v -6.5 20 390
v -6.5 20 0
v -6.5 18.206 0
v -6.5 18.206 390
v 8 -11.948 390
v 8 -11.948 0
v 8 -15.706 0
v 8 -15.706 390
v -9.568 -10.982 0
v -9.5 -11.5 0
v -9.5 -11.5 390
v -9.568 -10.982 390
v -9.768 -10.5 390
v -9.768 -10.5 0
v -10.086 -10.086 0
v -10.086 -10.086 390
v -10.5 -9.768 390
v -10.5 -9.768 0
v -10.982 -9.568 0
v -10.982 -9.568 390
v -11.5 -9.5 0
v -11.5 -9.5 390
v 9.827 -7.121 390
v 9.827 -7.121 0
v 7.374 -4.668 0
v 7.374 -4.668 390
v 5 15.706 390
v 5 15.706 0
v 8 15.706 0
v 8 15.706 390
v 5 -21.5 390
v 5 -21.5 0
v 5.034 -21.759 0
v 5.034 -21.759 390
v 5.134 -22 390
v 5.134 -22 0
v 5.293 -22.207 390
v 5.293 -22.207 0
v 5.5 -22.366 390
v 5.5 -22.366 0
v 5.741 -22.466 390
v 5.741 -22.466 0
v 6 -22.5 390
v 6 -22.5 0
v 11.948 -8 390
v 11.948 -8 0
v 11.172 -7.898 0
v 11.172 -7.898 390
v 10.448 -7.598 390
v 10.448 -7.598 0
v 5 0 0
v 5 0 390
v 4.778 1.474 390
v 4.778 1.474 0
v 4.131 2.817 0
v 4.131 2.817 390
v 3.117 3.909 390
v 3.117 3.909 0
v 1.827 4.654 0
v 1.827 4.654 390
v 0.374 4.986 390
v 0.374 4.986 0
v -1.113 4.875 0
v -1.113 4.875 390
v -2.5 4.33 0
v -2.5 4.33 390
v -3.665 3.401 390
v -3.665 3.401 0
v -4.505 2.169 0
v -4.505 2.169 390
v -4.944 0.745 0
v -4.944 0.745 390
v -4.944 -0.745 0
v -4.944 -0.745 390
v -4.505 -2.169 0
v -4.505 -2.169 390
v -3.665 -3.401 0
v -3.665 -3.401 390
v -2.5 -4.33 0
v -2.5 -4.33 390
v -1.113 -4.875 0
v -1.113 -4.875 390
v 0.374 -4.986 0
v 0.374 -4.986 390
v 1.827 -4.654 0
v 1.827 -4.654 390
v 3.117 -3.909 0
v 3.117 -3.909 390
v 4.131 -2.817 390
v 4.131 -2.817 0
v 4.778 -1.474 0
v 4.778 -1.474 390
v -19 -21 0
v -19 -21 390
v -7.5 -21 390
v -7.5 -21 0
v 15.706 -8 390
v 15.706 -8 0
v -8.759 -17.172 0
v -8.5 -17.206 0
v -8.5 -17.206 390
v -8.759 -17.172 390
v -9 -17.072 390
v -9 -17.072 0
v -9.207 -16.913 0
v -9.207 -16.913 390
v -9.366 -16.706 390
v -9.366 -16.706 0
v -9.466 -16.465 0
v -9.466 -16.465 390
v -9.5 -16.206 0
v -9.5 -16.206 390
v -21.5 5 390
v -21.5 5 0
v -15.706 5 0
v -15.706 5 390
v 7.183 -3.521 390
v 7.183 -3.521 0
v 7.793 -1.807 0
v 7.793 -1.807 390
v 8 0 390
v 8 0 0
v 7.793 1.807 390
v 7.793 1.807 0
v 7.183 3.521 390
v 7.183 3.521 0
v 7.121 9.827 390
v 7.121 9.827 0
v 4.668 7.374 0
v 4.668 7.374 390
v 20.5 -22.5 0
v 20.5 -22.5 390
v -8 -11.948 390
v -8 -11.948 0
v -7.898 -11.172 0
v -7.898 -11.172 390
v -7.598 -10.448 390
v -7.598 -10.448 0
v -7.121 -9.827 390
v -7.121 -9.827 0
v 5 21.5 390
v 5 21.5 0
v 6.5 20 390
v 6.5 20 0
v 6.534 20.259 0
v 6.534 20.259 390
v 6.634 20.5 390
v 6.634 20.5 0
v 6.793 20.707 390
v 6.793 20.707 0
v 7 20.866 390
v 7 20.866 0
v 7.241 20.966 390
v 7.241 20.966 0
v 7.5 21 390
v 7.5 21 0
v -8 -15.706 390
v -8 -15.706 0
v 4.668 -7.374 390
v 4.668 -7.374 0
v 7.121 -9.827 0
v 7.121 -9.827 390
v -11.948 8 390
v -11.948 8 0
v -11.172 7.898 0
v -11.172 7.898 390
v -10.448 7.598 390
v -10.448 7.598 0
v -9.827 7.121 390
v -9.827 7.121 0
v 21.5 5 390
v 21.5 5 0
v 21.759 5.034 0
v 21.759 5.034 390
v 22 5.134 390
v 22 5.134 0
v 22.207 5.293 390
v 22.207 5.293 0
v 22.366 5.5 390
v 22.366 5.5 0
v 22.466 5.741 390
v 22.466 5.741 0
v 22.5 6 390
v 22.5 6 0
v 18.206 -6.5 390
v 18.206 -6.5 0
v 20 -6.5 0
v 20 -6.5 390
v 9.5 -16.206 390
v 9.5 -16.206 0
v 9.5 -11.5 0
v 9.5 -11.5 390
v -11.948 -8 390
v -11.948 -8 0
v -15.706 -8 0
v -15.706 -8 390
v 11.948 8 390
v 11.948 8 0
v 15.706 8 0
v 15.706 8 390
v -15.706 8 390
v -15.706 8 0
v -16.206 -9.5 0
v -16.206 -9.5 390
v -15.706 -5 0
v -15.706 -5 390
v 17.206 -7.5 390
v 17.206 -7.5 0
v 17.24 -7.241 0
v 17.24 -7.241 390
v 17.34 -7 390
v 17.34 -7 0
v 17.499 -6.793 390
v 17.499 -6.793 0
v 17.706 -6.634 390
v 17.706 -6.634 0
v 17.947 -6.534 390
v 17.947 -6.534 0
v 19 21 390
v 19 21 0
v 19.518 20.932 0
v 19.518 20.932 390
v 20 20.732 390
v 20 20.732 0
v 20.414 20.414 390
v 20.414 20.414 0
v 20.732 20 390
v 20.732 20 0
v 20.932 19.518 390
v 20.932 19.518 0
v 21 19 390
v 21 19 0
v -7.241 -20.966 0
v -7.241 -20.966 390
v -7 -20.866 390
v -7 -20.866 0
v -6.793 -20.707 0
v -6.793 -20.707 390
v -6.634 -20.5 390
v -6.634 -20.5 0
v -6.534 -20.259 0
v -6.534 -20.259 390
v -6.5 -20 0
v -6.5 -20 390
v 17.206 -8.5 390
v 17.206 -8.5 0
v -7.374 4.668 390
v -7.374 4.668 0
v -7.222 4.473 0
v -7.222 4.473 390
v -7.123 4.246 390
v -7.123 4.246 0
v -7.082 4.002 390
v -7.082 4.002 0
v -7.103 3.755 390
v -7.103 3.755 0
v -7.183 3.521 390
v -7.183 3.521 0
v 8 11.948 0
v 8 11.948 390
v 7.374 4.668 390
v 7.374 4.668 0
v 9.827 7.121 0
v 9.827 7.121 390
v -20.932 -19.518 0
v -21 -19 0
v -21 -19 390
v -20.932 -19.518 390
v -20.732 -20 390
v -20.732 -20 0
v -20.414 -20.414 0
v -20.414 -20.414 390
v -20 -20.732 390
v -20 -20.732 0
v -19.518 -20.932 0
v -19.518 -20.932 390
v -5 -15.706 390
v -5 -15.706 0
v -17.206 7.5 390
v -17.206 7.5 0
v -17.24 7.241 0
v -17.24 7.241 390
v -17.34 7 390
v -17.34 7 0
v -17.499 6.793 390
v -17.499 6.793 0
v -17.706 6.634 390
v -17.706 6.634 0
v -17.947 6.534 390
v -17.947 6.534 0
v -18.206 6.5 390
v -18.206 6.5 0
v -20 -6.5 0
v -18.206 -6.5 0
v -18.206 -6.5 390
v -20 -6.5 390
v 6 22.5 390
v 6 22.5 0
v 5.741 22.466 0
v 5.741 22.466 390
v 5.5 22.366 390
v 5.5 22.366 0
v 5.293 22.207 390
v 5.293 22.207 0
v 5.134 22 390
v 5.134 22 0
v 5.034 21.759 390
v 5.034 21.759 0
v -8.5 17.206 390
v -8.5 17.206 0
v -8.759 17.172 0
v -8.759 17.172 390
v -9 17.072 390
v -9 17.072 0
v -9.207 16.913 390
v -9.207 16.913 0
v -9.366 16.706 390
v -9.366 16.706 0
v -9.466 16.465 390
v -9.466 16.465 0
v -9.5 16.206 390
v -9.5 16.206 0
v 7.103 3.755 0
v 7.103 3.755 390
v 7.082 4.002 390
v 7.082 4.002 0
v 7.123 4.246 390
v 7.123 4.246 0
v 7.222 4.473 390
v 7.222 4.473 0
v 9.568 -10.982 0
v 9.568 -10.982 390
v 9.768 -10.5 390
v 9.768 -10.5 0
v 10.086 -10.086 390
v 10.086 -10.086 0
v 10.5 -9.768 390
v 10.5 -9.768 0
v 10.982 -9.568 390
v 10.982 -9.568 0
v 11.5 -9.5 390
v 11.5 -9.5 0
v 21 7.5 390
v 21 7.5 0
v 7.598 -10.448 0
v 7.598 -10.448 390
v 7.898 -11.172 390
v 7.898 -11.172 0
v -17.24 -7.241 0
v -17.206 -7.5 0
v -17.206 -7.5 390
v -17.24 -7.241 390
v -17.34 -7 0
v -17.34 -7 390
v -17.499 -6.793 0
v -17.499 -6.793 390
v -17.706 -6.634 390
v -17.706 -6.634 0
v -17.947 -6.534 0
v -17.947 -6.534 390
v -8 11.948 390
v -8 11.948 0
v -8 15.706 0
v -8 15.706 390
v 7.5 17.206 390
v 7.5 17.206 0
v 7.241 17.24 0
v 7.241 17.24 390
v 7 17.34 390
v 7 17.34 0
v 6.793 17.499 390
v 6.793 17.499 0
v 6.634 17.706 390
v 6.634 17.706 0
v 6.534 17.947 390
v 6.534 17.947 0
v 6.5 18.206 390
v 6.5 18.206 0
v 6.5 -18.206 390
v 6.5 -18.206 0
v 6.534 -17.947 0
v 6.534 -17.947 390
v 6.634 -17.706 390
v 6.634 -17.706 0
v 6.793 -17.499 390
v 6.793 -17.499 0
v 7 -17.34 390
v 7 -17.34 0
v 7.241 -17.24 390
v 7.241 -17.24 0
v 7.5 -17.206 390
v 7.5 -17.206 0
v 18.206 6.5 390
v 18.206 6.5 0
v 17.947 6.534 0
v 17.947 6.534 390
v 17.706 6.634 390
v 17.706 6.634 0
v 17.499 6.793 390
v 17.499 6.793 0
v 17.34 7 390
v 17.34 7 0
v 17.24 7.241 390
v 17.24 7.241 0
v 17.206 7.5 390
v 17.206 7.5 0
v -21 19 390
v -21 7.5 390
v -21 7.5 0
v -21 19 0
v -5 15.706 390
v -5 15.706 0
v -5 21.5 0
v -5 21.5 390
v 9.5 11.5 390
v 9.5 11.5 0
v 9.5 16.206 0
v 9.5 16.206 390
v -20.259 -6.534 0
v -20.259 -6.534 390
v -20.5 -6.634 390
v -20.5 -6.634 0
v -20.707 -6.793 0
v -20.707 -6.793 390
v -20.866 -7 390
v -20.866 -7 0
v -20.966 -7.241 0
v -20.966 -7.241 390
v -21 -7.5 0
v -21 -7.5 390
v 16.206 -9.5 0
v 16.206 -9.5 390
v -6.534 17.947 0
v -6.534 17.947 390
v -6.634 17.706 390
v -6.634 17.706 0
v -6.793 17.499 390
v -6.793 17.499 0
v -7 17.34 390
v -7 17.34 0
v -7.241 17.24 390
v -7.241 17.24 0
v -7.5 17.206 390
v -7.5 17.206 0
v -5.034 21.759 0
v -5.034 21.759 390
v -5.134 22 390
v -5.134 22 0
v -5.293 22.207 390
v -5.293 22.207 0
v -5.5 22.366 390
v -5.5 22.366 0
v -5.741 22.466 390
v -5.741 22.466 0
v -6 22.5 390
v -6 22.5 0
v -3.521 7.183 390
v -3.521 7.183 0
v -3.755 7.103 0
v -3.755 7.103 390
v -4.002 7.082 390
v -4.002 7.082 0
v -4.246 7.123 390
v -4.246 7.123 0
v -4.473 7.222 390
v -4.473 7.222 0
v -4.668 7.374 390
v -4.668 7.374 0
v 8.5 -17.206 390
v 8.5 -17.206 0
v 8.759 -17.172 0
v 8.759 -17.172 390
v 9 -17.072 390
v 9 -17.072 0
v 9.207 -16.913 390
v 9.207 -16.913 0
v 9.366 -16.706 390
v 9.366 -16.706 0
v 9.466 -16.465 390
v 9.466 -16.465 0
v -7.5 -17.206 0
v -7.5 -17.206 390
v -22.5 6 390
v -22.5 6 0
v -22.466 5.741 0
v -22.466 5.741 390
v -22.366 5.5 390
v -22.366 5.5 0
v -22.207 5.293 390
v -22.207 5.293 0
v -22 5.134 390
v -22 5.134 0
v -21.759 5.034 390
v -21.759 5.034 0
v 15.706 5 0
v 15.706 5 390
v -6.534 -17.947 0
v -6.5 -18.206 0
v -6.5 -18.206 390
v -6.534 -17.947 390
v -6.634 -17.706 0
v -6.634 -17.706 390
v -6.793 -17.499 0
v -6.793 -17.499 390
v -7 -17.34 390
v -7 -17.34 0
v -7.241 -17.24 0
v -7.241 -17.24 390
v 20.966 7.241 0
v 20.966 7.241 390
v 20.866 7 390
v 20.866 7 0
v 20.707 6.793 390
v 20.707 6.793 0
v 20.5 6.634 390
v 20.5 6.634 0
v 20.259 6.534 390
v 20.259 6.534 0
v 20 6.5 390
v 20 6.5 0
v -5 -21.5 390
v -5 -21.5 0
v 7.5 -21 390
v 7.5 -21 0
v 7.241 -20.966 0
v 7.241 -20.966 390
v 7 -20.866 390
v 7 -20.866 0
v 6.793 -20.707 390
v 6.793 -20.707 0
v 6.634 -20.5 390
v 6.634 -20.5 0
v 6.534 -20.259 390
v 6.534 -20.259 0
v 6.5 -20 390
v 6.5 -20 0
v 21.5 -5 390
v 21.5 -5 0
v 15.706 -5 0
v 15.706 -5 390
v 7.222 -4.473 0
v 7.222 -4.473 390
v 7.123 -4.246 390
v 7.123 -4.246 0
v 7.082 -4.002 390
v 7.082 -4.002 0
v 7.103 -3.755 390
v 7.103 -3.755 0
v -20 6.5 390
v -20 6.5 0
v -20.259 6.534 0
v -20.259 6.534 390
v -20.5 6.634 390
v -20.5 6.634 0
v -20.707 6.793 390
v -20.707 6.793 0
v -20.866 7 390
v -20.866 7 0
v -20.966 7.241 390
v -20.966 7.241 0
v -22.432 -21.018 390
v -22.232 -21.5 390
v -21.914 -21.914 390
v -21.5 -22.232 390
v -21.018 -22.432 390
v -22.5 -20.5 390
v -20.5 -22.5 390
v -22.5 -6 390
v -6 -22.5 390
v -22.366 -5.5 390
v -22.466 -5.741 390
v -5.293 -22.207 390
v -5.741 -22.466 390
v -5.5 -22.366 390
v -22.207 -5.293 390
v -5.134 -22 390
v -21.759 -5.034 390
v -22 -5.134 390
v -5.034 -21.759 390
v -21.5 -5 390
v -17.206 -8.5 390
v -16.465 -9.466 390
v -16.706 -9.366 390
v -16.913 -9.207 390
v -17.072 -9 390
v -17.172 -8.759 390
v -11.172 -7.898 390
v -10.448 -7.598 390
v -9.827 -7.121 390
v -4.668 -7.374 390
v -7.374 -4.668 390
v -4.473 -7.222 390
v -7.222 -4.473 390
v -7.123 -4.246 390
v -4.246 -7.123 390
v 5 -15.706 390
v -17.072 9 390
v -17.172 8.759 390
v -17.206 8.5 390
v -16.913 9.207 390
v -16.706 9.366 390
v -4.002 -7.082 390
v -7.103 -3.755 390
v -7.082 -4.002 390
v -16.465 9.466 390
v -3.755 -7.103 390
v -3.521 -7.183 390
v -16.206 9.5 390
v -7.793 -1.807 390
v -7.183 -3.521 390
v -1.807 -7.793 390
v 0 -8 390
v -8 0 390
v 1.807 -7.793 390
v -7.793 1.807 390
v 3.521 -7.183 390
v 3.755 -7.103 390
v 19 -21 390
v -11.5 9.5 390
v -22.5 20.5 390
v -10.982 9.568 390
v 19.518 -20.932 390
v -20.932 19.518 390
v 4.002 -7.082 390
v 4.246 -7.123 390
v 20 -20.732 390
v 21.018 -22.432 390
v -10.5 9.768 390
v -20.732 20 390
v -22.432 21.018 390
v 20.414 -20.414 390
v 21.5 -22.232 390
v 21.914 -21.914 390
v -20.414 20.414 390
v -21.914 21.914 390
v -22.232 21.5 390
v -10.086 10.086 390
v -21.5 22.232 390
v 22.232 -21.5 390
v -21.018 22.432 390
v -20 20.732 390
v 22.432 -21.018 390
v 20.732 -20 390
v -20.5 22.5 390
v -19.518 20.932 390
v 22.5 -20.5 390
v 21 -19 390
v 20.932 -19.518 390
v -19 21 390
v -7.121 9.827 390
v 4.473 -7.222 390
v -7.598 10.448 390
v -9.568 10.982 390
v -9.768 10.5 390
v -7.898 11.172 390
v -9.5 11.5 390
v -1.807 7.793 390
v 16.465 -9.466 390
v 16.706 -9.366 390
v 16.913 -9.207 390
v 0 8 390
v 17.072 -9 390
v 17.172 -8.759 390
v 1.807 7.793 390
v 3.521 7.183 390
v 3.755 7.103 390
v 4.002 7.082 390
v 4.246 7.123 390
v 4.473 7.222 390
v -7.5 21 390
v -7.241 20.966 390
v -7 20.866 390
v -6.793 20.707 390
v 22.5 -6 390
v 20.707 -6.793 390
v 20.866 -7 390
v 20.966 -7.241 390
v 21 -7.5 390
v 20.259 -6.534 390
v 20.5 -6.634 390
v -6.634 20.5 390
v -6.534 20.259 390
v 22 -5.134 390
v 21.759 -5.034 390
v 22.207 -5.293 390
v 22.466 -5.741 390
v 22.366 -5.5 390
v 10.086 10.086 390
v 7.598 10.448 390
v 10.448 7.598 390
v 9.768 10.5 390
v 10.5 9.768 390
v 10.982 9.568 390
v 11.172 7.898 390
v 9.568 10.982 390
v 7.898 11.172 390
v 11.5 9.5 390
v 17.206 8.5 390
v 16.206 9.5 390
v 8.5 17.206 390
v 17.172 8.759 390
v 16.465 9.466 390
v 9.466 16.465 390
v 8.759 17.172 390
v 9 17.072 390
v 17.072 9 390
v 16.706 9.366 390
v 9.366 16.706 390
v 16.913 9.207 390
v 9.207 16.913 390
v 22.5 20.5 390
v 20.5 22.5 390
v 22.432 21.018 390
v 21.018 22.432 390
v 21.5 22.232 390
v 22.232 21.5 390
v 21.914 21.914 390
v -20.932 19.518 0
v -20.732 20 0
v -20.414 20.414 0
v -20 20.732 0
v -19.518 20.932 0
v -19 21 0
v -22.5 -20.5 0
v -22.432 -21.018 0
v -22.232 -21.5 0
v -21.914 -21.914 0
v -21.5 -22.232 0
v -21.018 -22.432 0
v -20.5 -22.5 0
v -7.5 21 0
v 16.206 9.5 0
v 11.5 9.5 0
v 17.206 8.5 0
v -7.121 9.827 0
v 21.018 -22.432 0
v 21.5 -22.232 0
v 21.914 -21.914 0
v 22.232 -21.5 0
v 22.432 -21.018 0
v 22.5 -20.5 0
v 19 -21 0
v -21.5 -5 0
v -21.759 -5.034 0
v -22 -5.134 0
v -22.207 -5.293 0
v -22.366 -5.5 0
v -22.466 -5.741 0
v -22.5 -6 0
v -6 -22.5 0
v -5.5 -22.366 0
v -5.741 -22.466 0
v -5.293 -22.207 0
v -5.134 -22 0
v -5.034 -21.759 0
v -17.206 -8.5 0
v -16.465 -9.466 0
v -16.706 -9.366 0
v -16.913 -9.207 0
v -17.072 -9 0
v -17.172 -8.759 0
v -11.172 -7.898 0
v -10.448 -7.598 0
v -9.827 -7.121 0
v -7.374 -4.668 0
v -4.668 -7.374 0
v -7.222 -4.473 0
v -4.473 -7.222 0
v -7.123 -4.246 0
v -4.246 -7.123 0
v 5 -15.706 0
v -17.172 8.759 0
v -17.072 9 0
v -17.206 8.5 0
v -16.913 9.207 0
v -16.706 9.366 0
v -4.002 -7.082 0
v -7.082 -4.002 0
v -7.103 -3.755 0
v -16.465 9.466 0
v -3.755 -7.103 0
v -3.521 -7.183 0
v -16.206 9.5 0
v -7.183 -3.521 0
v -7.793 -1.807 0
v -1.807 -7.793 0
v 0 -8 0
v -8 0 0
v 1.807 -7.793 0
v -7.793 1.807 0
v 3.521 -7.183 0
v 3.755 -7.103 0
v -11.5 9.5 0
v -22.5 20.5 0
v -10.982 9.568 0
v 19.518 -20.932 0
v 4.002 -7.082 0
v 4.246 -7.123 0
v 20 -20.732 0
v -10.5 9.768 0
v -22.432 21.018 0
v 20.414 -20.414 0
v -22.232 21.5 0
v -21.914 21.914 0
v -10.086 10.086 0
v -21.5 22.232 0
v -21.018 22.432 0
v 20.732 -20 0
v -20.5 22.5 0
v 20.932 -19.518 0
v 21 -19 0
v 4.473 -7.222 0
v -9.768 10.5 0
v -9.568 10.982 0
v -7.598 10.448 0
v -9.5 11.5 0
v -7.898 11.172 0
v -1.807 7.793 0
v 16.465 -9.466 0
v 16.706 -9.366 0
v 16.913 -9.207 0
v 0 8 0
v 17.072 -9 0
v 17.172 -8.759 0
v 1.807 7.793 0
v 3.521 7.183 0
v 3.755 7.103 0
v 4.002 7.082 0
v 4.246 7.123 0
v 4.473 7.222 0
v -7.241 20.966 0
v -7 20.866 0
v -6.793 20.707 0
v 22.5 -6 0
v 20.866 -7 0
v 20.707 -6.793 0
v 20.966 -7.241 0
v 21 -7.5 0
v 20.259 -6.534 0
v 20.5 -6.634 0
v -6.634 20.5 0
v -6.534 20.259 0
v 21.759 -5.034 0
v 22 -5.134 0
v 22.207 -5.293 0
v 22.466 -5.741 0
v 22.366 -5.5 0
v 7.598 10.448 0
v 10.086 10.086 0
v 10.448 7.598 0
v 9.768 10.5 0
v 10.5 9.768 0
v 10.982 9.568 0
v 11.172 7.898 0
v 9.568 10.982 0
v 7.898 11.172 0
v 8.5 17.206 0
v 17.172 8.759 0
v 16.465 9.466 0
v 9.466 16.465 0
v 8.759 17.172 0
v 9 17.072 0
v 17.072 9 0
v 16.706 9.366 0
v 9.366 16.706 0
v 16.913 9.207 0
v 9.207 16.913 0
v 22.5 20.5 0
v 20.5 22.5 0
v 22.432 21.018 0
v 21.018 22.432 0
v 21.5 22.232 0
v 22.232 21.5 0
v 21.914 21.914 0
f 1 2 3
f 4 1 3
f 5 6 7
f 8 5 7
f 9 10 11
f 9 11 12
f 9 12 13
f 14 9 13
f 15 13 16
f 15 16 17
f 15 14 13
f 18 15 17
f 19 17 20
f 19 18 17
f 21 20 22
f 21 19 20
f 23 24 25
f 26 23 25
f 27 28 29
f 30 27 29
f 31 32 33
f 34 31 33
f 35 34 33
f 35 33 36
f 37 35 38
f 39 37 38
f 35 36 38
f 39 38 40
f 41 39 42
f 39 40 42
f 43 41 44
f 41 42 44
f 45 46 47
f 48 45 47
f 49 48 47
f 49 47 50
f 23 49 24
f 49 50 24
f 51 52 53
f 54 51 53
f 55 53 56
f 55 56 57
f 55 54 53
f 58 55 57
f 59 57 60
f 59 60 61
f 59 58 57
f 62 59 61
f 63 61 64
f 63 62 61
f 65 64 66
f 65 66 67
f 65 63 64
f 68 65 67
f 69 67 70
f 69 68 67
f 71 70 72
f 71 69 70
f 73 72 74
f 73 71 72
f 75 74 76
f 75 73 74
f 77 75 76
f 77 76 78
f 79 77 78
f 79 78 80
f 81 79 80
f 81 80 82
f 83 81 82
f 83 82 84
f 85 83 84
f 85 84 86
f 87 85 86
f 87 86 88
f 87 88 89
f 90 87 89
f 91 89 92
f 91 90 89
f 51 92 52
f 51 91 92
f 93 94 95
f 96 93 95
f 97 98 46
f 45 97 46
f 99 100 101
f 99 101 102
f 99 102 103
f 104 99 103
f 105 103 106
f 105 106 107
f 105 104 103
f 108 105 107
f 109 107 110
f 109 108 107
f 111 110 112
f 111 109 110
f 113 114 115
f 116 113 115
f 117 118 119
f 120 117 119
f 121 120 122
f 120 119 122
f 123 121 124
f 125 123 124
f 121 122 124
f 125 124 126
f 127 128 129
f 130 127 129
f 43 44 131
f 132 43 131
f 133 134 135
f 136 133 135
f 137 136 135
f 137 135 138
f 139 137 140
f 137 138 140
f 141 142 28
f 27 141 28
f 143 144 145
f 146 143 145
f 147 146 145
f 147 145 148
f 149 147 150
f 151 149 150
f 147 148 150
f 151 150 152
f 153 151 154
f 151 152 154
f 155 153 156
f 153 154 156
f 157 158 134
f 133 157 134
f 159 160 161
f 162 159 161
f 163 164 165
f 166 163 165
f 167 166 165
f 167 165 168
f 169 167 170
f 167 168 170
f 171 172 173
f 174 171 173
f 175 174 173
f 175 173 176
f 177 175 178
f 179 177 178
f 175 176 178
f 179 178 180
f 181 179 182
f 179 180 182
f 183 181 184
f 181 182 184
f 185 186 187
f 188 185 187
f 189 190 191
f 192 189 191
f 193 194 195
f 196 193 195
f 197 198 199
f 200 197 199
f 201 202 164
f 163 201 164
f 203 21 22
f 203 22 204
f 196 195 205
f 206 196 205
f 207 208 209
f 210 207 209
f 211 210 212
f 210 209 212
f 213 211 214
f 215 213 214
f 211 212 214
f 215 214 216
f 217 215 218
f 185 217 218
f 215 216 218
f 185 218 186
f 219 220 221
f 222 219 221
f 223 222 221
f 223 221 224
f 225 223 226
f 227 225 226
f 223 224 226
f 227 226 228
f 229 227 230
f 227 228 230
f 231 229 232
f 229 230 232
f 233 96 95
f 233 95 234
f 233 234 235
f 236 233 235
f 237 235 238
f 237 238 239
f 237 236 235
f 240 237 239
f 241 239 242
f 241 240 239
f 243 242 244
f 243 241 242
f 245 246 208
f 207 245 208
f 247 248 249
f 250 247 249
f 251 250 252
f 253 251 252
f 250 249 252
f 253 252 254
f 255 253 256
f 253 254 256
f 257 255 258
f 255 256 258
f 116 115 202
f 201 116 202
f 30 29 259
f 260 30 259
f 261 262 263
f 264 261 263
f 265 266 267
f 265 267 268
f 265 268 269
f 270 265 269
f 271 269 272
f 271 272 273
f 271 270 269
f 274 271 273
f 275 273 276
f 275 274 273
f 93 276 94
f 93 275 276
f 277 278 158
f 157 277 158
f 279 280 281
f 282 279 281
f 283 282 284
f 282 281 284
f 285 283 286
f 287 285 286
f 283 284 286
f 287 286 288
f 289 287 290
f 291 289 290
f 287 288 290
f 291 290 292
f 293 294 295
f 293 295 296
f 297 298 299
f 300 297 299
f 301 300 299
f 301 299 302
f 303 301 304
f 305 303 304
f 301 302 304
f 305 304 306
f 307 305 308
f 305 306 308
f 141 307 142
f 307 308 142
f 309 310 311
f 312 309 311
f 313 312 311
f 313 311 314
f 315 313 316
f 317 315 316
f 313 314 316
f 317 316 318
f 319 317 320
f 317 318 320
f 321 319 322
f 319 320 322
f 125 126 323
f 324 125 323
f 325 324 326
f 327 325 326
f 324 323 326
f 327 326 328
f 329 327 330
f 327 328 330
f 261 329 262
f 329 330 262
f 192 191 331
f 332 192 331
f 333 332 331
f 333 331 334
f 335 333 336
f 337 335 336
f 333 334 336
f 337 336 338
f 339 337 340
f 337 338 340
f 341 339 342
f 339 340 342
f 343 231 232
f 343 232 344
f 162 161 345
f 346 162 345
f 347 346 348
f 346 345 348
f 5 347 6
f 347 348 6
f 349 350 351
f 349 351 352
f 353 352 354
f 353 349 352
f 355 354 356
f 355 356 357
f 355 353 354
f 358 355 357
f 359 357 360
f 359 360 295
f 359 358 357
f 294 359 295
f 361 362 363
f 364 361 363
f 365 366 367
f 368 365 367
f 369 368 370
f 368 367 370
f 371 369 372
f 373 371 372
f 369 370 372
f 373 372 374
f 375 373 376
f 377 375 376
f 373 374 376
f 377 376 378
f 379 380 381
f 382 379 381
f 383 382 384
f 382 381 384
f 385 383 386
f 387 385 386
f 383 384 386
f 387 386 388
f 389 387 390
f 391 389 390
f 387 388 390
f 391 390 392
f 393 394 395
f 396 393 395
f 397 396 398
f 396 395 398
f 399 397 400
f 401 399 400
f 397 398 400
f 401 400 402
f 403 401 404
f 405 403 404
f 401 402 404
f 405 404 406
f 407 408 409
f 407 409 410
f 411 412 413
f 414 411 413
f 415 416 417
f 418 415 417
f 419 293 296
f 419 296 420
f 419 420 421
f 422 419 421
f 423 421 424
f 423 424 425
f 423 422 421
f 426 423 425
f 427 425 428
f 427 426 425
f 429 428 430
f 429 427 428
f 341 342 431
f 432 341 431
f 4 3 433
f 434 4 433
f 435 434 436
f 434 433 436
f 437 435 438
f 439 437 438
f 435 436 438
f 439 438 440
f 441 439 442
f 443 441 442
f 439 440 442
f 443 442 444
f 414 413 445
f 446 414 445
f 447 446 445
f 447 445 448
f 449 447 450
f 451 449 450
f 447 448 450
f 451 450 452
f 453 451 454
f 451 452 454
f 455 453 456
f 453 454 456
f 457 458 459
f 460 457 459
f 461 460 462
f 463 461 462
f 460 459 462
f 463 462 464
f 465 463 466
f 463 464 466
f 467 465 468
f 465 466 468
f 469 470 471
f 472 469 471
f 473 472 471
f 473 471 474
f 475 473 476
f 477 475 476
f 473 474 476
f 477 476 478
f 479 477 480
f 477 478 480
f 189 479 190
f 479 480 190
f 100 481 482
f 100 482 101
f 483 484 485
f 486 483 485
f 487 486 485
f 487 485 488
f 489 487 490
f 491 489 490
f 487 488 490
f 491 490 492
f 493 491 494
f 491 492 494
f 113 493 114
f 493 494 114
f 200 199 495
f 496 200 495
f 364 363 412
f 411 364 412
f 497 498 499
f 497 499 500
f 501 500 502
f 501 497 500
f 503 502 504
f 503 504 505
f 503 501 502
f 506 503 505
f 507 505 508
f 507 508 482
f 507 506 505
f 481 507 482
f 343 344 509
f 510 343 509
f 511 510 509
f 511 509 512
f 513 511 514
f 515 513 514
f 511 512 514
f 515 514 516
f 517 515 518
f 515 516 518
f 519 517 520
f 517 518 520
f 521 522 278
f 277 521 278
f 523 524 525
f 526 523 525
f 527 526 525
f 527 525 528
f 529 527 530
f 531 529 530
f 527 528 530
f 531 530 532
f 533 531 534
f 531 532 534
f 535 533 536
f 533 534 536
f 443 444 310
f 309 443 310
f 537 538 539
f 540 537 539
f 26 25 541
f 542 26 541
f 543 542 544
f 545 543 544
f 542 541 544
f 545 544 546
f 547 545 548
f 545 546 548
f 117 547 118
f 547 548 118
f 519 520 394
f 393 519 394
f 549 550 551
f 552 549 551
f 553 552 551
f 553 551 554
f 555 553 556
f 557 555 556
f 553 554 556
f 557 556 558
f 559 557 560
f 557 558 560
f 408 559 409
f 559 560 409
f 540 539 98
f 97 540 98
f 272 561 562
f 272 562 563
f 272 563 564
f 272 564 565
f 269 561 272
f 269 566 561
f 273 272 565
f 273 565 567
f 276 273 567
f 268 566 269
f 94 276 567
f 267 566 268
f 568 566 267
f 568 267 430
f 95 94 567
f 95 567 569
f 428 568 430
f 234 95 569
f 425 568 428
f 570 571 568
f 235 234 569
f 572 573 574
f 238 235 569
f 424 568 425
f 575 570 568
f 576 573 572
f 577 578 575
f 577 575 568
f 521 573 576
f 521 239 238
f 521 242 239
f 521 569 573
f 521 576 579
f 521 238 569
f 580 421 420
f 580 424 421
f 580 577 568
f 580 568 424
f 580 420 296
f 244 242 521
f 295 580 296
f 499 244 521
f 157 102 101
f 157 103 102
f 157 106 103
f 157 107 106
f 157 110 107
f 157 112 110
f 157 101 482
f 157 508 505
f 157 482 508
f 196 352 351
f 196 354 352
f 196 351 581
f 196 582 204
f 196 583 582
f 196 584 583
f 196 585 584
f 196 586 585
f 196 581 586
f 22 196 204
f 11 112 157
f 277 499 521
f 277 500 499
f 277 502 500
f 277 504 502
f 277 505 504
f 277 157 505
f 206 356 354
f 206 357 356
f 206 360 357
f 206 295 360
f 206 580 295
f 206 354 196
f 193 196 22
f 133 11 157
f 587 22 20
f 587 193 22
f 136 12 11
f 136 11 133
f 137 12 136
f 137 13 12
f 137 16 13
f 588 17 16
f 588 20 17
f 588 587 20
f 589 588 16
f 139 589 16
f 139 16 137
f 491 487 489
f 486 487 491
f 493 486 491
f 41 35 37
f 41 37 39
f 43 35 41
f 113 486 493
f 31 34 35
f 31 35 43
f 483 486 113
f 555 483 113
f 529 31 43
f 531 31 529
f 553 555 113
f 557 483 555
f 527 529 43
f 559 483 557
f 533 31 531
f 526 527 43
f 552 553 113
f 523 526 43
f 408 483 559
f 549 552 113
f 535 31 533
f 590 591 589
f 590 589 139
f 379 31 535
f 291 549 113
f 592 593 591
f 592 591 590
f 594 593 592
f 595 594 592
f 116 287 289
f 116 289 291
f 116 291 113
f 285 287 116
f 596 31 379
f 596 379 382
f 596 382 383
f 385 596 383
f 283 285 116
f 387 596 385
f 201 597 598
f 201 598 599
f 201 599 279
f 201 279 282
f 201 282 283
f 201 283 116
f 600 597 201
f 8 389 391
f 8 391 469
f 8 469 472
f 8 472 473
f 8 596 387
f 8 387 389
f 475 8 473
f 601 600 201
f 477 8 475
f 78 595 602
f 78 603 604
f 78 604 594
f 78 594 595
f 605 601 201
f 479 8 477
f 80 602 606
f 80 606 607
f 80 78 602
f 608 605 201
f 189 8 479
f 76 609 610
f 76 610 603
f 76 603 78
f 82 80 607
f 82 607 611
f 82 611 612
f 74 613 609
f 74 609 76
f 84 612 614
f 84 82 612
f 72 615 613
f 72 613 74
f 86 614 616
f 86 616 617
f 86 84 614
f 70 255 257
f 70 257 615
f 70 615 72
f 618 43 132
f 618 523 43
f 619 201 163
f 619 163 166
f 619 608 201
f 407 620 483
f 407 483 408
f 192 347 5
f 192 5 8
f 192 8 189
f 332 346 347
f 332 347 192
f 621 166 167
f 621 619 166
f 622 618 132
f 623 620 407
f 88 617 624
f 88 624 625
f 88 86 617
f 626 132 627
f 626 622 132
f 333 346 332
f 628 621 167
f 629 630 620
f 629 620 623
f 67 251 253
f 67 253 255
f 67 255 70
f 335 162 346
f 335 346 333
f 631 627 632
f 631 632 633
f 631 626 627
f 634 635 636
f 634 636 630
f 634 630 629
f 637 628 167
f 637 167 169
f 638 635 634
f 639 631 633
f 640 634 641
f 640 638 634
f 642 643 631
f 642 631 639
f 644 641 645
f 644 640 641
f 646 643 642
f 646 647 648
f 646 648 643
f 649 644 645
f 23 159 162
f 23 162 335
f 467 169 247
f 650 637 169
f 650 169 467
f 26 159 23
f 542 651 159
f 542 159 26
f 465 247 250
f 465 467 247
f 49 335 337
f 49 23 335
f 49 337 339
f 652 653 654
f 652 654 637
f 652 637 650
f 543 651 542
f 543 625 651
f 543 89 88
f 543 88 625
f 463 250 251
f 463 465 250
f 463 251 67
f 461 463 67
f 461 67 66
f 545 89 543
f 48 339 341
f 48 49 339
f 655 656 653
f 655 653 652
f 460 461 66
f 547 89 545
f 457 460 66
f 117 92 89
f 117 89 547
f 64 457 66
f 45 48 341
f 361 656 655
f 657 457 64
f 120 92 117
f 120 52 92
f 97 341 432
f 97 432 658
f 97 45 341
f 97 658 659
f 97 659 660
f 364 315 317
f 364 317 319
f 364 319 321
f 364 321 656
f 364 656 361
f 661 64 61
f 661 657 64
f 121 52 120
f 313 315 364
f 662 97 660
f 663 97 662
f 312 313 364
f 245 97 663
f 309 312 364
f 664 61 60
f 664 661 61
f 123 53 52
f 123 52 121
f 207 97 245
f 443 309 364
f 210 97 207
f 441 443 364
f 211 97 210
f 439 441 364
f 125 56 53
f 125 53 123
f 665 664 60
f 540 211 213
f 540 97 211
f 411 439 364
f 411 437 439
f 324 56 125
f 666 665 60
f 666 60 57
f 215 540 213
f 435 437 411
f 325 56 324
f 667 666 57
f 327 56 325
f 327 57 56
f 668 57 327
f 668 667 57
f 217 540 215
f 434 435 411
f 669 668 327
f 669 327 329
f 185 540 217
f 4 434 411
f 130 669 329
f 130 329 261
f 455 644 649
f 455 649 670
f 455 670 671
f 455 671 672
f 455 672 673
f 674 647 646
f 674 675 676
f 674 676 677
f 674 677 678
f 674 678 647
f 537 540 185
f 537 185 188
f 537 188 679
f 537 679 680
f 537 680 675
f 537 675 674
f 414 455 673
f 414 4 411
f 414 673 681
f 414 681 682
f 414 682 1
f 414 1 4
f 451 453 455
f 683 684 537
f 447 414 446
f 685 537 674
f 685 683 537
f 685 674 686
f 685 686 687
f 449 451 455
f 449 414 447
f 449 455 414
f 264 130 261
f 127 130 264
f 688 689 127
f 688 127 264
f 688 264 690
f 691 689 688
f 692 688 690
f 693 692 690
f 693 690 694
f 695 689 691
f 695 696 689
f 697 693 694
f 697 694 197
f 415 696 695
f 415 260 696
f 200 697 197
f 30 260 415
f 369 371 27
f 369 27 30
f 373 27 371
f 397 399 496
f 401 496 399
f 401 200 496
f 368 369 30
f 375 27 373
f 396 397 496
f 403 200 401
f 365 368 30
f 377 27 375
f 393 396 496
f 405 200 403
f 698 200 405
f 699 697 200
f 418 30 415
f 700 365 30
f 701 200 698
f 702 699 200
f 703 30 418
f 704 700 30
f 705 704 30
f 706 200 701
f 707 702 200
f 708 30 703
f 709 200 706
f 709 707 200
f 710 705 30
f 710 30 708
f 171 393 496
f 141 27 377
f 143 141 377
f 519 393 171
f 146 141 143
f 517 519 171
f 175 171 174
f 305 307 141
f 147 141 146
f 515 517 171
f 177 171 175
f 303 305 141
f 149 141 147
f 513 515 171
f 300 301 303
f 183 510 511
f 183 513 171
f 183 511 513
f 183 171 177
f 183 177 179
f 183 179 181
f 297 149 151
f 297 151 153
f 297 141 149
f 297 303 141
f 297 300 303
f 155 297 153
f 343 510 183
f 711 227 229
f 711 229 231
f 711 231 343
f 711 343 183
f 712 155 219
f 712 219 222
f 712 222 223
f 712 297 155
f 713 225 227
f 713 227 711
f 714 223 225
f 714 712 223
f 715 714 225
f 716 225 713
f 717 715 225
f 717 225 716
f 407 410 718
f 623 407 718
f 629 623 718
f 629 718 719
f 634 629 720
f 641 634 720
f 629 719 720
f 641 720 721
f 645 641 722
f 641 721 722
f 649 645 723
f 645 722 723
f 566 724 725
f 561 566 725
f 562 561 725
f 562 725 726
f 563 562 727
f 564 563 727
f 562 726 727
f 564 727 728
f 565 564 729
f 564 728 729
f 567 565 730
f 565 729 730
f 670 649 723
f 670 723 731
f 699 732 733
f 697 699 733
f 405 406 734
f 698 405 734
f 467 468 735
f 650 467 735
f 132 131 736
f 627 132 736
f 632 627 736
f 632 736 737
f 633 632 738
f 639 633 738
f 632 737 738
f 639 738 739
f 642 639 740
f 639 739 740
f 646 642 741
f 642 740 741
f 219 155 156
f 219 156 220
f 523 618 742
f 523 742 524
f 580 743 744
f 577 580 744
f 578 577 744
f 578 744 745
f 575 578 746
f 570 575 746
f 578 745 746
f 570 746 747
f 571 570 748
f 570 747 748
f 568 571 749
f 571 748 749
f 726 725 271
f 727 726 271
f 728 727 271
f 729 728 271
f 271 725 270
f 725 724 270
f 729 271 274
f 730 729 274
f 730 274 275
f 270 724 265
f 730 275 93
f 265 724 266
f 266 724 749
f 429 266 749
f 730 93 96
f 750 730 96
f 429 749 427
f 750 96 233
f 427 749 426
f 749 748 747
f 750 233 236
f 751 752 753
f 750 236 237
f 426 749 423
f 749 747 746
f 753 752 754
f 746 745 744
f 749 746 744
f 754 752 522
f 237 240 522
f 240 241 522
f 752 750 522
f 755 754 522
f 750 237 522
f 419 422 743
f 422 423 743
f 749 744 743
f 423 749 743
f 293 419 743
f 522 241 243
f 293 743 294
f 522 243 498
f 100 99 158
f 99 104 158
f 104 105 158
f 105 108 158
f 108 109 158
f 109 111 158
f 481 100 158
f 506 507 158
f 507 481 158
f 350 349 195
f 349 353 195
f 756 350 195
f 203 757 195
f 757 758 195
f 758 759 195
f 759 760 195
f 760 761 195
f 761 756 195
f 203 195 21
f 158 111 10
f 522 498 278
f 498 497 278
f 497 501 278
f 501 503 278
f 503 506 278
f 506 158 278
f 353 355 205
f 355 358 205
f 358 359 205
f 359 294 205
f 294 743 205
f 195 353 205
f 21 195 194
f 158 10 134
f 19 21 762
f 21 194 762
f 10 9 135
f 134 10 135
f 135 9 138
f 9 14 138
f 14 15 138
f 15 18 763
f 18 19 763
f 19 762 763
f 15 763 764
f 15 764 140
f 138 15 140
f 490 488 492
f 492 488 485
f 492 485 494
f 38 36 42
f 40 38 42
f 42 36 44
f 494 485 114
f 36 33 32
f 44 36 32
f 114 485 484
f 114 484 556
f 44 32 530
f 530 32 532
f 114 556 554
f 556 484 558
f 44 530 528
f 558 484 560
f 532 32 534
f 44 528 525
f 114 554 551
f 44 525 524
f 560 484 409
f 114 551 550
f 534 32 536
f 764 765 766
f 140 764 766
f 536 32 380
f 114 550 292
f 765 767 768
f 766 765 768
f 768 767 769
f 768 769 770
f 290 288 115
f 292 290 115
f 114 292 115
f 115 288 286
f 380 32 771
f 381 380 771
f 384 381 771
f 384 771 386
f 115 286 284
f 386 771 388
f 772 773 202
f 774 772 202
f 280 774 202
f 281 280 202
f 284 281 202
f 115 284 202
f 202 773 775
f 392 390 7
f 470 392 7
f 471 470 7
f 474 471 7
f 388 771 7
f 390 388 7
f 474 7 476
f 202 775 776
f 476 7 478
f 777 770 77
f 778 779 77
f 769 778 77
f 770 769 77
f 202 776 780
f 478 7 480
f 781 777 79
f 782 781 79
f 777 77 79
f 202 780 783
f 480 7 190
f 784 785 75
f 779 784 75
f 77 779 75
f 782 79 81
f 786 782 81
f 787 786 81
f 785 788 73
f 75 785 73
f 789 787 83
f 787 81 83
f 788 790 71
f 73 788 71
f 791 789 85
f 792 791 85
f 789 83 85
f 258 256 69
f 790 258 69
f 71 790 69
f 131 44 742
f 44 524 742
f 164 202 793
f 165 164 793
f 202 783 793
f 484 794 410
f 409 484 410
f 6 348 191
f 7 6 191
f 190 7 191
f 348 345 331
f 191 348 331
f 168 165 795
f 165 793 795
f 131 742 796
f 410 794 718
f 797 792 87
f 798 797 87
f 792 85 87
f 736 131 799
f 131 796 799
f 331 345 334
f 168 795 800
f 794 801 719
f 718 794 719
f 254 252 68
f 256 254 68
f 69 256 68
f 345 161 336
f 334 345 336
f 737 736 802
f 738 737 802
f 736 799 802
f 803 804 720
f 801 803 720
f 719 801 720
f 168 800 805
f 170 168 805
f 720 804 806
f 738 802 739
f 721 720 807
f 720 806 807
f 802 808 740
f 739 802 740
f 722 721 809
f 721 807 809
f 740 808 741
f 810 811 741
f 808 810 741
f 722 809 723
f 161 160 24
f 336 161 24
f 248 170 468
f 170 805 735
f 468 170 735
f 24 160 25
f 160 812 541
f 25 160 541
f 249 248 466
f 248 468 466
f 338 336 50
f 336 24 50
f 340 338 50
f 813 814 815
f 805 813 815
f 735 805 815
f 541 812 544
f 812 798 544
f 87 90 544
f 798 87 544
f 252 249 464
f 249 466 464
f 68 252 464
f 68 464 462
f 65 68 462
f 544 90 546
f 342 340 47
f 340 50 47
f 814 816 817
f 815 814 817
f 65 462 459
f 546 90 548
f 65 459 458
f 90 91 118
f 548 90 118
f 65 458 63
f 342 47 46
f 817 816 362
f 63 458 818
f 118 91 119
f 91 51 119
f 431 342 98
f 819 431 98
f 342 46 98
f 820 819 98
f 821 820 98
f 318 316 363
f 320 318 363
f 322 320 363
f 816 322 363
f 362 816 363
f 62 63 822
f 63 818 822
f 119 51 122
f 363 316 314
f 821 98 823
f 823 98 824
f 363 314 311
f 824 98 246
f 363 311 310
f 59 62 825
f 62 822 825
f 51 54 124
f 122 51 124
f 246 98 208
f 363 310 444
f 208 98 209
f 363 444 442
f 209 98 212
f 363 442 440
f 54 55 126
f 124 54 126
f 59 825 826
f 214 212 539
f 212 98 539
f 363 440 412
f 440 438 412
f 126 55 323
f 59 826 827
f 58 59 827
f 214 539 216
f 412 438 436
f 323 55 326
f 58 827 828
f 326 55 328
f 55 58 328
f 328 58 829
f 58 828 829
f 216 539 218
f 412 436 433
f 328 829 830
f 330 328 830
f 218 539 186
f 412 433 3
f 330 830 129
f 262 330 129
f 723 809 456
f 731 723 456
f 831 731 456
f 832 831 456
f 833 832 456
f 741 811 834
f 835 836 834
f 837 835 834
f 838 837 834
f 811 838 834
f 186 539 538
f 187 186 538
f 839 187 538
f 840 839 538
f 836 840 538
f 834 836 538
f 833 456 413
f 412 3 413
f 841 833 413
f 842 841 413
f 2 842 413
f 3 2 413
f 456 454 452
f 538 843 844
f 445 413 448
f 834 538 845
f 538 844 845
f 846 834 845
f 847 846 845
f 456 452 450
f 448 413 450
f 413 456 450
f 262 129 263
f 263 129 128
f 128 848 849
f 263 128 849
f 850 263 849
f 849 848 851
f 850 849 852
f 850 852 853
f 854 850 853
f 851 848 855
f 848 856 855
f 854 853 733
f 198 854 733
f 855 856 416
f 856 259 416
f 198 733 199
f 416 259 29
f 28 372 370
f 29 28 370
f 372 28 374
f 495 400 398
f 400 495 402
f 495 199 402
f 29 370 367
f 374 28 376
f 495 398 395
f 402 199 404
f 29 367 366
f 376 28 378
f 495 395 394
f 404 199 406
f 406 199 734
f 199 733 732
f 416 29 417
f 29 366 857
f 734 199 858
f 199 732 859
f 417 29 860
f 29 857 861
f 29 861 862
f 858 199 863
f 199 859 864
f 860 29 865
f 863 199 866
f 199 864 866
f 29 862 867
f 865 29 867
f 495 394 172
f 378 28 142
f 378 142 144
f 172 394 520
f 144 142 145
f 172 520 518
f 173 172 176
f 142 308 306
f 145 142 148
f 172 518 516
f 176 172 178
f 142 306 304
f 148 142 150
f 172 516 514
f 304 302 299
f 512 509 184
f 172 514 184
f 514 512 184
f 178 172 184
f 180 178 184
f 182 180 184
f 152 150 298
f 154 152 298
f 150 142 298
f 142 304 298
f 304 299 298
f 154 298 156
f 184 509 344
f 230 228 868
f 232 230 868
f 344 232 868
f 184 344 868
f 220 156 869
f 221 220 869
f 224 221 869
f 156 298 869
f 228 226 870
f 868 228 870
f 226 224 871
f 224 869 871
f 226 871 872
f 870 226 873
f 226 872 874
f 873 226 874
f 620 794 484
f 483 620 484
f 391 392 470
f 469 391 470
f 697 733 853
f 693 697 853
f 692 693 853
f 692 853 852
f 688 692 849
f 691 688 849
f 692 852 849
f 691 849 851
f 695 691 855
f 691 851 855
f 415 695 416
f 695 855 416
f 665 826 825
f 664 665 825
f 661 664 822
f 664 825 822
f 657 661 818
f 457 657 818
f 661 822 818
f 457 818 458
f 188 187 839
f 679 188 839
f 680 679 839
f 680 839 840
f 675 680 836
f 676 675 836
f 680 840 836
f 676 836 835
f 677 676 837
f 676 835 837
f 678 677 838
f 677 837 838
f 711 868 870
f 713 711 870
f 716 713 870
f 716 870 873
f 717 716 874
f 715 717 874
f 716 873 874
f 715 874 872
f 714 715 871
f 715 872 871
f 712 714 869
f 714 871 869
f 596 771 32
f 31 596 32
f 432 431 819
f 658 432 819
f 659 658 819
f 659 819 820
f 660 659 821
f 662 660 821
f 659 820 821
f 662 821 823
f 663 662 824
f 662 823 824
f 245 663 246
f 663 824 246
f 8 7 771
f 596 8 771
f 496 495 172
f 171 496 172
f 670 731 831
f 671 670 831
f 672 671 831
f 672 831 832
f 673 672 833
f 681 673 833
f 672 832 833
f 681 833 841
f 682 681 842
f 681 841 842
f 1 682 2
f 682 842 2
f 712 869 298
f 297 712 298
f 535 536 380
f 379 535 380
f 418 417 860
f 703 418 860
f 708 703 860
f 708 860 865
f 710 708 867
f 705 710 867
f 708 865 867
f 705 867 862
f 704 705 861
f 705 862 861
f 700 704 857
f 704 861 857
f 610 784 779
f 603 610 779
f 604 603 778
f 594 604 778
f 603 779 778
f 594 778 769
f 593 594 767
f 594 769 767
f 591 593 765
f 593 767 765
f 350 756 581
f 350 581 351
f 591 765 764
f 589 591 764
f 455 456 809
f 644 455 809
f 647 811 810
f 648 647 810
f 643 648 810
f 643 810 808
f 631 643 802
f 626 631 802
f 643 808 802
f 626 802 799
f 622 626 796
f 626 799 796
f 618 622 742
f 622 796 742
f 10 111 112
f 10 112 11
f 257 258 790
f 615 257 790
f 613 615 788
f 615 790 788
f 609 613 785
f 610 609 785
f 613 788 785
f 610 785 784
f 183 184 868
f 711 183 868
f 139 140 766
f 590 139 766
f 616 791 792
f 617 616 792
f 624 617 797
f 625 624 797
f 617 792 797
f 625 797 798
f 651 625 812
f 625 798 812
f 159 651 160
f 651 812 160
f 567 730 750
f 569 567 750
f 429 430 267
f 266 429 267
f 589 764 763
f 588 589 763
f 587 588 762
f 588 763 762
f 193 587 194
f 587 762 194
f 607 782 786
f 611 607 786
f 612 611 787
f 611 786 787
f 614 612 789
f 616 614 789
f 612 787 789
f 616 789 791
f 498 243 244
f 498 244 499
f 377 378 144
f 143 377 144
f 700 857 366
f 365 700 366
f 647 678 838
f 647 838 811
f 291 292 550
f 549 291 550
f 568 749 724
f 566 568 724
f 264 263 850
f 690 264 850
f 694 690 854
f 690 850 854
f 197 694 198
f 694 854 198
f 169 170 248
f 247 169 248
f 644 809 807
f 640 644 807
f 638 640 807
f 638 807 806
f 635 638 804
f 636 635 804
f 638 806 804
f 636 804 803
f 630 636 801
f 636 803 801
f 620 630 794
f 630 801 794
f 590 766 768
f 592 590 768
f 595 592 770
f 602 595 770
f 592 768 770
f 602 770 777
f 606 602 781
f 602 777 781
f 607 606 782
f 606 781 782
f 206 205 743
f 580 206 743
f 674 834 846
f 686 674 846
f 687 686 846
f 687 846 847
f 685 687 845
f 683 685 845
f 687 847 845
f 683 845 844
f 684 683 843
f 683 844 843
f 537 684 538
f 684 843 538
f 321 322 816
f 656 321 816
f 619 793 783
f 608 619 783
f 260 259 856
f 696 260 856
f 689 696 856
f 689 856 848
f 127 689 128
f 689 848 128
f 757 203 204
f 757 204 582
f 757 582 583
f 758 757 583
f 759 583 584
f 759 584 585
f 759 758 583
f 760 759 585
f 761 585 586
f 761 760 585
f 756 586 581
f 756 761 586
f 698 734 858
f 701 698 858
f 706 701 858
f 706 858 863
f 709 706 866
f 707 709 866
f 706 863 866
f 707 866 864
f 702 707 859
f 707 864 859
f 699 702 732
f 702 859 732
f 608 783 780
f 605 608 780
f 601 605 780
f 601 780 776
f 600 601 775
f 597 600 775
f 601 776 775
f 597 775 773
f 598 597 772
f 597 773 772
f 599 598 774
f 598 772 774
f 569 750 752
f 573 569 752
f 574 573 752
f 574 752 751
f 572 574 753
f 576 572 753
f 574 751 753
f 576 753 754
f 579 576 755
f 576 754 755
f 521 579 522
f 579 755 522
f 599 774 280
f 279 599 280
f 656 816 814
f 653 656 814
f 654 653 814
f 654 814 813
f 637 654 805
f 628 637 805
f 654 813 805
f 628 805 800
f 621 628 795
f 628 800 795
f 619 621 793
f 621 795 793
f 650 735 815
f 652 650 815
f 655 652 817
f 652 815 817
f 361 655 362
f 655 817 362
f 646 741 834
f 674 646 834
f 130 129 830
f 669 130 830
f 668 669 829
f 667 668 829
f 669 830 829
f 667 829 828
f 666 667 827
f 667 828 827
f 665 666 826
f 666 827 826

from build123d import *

# Parameters (mm, degrees)
SKETCH1_R           = 5
BOSS_EXTRUDE1_DEPTH = 390


with BuildPart() as part:
    # Sketch1 → Boss-Extrude1 (new body)
    with BuildSketch(Plane.XY):
        with BuildLine():
            Line((-5, -15.705854984), (-8, -15.705854984))
            Line((-8, -15.705854984), (-8, -11.948495671))
            ThreePointArc((-8, -11.948495671), (-7.771638598, -10.800445374), (-7.121320344, -9.827175327))
            Line((-7.121320344, -9.827175327), (-4.66838954, -7.374244523))
            ThreePointArc((-4.66838954, -7.374244523), (-4.125357909, -7.094903463), (-3.52114023, -7.183423382))
            ThreePointArc((-3.52114023, -7.183423382), (0, -8), (3.52114023, -7.183423382))
            ThreePointArc((3.52114023, -7.183423382), (4.125357909, -7.094903463), (4.66838954, -7.374244523))
            Line((4.66838954, -7.374244523), (7.121320344, -9.827175327))
            ThreePointArc((7.121320344, -9.827175327), (7.771638598, -10.800445374), (8, -11.948495671))
            Line((8, -11.948495671), (8, -15.705854984))
            Line((8, -15.705854984), (5, -15.705854984))
            Line((5, -15.705854984), (5, -21.5))
            ThreePointArc((5, -21.5), (5.292893219, -22.207106781), (6, -22.5))
            Line((6, -22.5), (20.5, -22.5))
            ThreePointArc((20.5, -22.5), (21.914213562, -21.914213562), (22.5, -20.5))
            Line((22.5, -20.5), (22.5, -6))
            ThreePointArc((22.5, -6), (22.207106781, -5.292893219), (21.5, -5))
            Line((21.5, -5), (15.705854984, -5))
            Line((15.705854984, -5), (15.705854984, -8))
            Line((15.705854984, -8), (11.948495671, -8))
            ThreePointArc((11.948495671, -8), (10.800445374, -7.771638598), (9.827175327, -7.121320344))
            Line((9.827175327, -7.121320344), (7.374244523, -4.66838954))
            ThreePointArc((7.374244523, -4.66838954), (7.094903463, -4.125357909), (7.183423382, -3.52114023))
            ThreePointArc((7.183423382, -3.52114023), (8, 0), (7.183423382, 3.52114023))
            ThreePointArc((7.183423382, 3.52114023), (7.094903463, 4.125357909), (7.374244523, 4.66838954))
            Line((7.374244523, 4.66838954), (9.827175327, 7.121320344))
            ThreePointArc((9.827175327, 7.121320344), (10.800445374, 7.771638598), (11.948495671, 8))
            Line((11.948495671, 8), (15.705854984, 8))
            Line((15.705854984, 8), (15.705854984, 5))
            Line((15.705854984, 5), (21.5, 5))
            ThreePointArc((21.5, 5), (22.207106781, 5.292893219), (22.5, 6))
            Line((22.5, 6), (22.5, 20.5))
            ThreePointArc((22.5, 20.5), (21.914213562, 21.914213562), (20.5, 22.5))
            Line((20.5, 22.5), (6, 22.5))
            ThreePointArc((6, 22.5), (5.292893219, 22.207106781), (5, 21.5))
            Line((5, 21.5), (5, 15.705854984))
            Line((5, 15.705854984), (8, 15.705854984))
            Line((8, 15.705854984), (8, 11.948495671))
            ThreePointArc((8, 11.948495671), (7.771638598, 10.800445374), (7.121320344, 9.827175327))
            Line((7.121320344, 9.827175327), (4.66838954, 7.374244523))
            ThreePointArc((4.66838954, 7.374244523), (4.125357909, 7.094903463), (3.52114023, 7.183423382))
            ThreePointArc((3.52114023, 7.183423382), (0, 8), (-3.52114023, 7.183423382))
            ThreePointArc((-3.52114023, 7.183423382), (-4.125357909, 7.094903463), (-4.66838954, 7.374244523))
            Line((-4.66838954, 7.374244523), (-7.121320344, 9.827175327))
            ThreePointArc((-7.121320344, 9.827175327), (-7.771638598, 10.800445374), (-8, 11.948495671))
            Line((-8, 11.948495671), (-8, 15.705854984))
            Line((-8, 15.705854984), (-5, 15.705854984))
            Line((-5, 15.705854984), (-5, 21.5))
            ThreePointArc((-5, 21.5), (-5.292893219, 22.207106781), (-6, 22.5))
            Line((-6, 22.5), (-20.5, 22.5))
            ThreePointArc((-20.5, 22.5), (-21.914213562, 21.914213562), (-22.5, 20.5))
            Line((-22.5, 20.5), (-22.5, 6))
            ThreePointArc((-22.5, 6), (-22.207106781, 5.292893219), (-21.5, 5))
            Line((-21.5, 5), (-15.705854984, 5))
            Line((-15.705854984, 5), (-15.705854984, 8))
            Line((-15.705854984, 8), (-11.948495671, 8))
            ThreePointArc((-11.948495671, 8), (-10.800445374, 7.771638598), (-9.827175327, 7.121320344))
            Line((-9.827175327, 7.121320344), (-7.374244523, 4.66838954))
            ThreePointArc((-7.374244523, 4.66838954), (-7.094903463, 4.125357909), (-7.183423382, 3.52114023))
            ThreePointArc((-7.183423382, 3.52114023), (-8, 0), (-7.183423382, -3.52114023))
            ThreePointArc((-7.183423382, -3.52114023), (-7.094903463, -4.125357909), (-7.374244523, -4.66838954))
            Line((-7.374244523, -4.66838954), (-9.827175327, -7.121320344))
            ThreePointArc((-9.827175327, -7.121320344), (-10.800445374, -7.771638598), (-11.948495671, -8))
            Line((-11.948495671, -8), (-15.705854984, -8))
            Line((-15.705854984, -8), (-15.705854984, -5))
            Line((-15.705854984, -5), (-21.5, -5))
            ThreePointArc((-21.5, -5), (-22.207106781, -5.292893219), (-22.5, -6))
            Line((-22.5, -6), (-22.5, -20.5))
            ThreePointArc((-22.5, -20.5), (-21.914213562, -21.914213562), (-20.5, -22.5))
            Line((-20.5, -22.5), (-6, -22.5))
            ThreePointArc((-6, -22.5), (-5.292893219, -22.207106781), (-5, -21.5))
            Line((-5, -21.5), (-5, -15.705854984))
        make_face()
        Circle(SKETCH1_R, mode=Mode.SUBTRACT)
        with BuildLine():
            Line((-19, -21), (-7.5, -21))
            ThreePointArc((-7.5, -21), (-6.792893219, -20.707106781), (-6.5, -20))
            Line((-6.5, -20), (-6.5, -18.205854984))
            ThreePointArc((-6.5, -18.205854984), (-6.792893219, -17.498748202), (-7.5, -17.205854984))
            Line((-7.5, -17.205854984), (-8.5, -17.205854984))
            ThreePointArc((-8.5, -17.205854984), (-9.207106781, -16.912961765), (-9.5, -16.205854984))
            Line((-9.5, -16.205854984), (-9.5, -11.5))
            ThreePointArc((-9.5, -11.5), (-10.085786438, -10.085786438), (-11.5, -9.5))
            Line((-11.5, -9.5), (-16.205854984, -9.5))
            ThreePointArc((-16.205854984, -9.5), (-16.912961765, -9.207106781), (-17.205854984, -8.5))
            Line((-17.205854984, -8.5), (-17.205854984, -7.5))
            ThreePointArc((-17.205854984, -7.5), (-17.498748202, -6.792893219), (-18.205854984, -6.5))
            Line((-18.205854984, -6.5), (-20, -6.5))
            ThreePointArc((-20, -6.5), (-20.707106781, -6.792893219), (-21, -7.5))
            Line((-21, -7.5), (-21, -19))
            ThreePointArc((-21, -19), (-20.414213562, -20.414213562), (-19, -21))
        make_face(mode=Mode.SUBTRACT)
        with BuildLine():
            Line((-9.5, 16.205854984), (-9.5, 11.5))
            ThreePointArc((-9.5, 11.5), (-10.085786438, 10.085786438), (-11.5, 9.5))
            Line((-11.5, 9.5), (-16.205854984, 9.5))
            ThreePointArc((-16.205854984, 9.5), (-16.912961765, 9.207106781), (-17.205854984, 8.5))
            Line((-17.205854984, 8.5), (-17.205854984, 7.5))
            ThreePointArc((-17.205854984, 7.5), (-17.498748202, 6.792893219), (-18.205854984, 6.5))
            Line((-18.205854984, 6.5), (-20, 6.5))
            ThreePointArc((-20, 6.5), (-20.707106781, 6.792893219), (-21, 7.5))
            Line((-21, 7.5), (-21, 19))
            ThreePointArc((-21, 19), (-20.414213562, 20.414213562), (-19, 21))
            Line((-19, 21), (-7.5, 21))
            ThreePointArc((-7.5, 21), (-6.792893219, 20.707106781), (-6.5, 20))
            Line((-6.5, 20), (-6.5, 18.205854984))
            ThreePointArc((-6.5, 18.205854984), (-6.792893219, 17.498748202), (-7.5, 17.205854984))
            Line((-7.5, 17.205854984), (-8.5, 17.205854984))
            ThreePointArc((-8.5, 17.205854984), (-9.207106781, 16.912961765), (-9.5, 16.205854984))
        make_face(mode=Mode.SUBTRACT)
        with BuildLine():
            Line((16.205854984, 9.5), (11.5, 9.5))
            ThreePointArc((11.5, 9.5), (10.085786438, 10.085786438), (9.5, 11.5))
            Line((9.5, 11.5), (9.5, 16.205854984))
            ThreePointArc((9.5, 16.205854984), (9.207106781, 16.912961765), (8.5, 17.205854984))
            Line((8.5, 17.205854984), (7.5, 17.205854984))
            ThreePointArc((7.5, 17.205854984), (6.792893219, 17.498748202), (6.5, 18.205854984))
            Line((6.5, 18.205854984), (6.5, 20))
            ThreePointArc((6.5, 20), (6.792893219, 20.707106781), (7.5, 21))
            Line((7.5, 21), (19, 21))
            ThreePointArc((19, 21), (20.414213562, 20.414213562), (21, 19))
            Line((21, 19), (21, 7.5))
            ThreePointArc((21, 7.5), (20.707106781, 6.792893219), (20, 6.5))
            Line((20, 6.5), (18.205854984, 6.5))
            ThreePointArc((18.205854984, 6.5), (17.498748202, 6.792893219), (17.205854984, 7.5))
            Line((17.205854984, 7.5), (17.205854984, 8.5))
            ThreePointArc((17.205854984, 8.5), (16.912961765, 9.207106781), (16.205854984, 9.5))
        make_face(mode=Mode.SUBTRACT)
        with BuildLine():
            Line((9.5, -16.205854984), (9.5, -11.5))
            ThreePointArc((9.5, -11.5), (10.085786438, -10.085786438), (11.5, -9.5))
            Line((11.5, -9.5), (16.205854984, -9.5))
            ThreePointArc((16.205854984, -9.5), (16.912961765, -9.207106781), (17.205854984, -8.5))
            Line((17.205854984, -8.5), (17.205854984, -7.5))
            ThreePointArc((17.205854984, -7.5), (17.498748202, -6.792893219), (18.205854984, -6.5))
            Line((18.205854984, -6.5), (20, -6.5))
            ThreePointArc((20, -6.5), (20.707106781, -6.792893219), (21, -7.5))
            Line((21, -7.5), (21, -19))
            ThreePointArc((21, -19), (20.414213562, -20.414213562), (19, -21))
            Line((19, -21), (7.5, -21))
            ThreePointArc((7.5, -21), (6.792893219, -20.707106781), (6.5, -20))
            Line((6.5, -20), (6.5, -18.205854984))
            ThreePointArc((6.5, -18.205854984), (6.792893219, -17.498748202), (7.5, -17.205854984))
            Line((7.5, -17.205854984), (8.5, -17.205854984))
            ThreePointArc((8.5, -17.205854984), (9.207106781, -16.912961765), (9.5, -16.205854984))
        make_face(mode=Mode.SUBTRACT)
    extrude(amount=BOSS_EXTRUDE1_DEPTH)


solid = part.part
